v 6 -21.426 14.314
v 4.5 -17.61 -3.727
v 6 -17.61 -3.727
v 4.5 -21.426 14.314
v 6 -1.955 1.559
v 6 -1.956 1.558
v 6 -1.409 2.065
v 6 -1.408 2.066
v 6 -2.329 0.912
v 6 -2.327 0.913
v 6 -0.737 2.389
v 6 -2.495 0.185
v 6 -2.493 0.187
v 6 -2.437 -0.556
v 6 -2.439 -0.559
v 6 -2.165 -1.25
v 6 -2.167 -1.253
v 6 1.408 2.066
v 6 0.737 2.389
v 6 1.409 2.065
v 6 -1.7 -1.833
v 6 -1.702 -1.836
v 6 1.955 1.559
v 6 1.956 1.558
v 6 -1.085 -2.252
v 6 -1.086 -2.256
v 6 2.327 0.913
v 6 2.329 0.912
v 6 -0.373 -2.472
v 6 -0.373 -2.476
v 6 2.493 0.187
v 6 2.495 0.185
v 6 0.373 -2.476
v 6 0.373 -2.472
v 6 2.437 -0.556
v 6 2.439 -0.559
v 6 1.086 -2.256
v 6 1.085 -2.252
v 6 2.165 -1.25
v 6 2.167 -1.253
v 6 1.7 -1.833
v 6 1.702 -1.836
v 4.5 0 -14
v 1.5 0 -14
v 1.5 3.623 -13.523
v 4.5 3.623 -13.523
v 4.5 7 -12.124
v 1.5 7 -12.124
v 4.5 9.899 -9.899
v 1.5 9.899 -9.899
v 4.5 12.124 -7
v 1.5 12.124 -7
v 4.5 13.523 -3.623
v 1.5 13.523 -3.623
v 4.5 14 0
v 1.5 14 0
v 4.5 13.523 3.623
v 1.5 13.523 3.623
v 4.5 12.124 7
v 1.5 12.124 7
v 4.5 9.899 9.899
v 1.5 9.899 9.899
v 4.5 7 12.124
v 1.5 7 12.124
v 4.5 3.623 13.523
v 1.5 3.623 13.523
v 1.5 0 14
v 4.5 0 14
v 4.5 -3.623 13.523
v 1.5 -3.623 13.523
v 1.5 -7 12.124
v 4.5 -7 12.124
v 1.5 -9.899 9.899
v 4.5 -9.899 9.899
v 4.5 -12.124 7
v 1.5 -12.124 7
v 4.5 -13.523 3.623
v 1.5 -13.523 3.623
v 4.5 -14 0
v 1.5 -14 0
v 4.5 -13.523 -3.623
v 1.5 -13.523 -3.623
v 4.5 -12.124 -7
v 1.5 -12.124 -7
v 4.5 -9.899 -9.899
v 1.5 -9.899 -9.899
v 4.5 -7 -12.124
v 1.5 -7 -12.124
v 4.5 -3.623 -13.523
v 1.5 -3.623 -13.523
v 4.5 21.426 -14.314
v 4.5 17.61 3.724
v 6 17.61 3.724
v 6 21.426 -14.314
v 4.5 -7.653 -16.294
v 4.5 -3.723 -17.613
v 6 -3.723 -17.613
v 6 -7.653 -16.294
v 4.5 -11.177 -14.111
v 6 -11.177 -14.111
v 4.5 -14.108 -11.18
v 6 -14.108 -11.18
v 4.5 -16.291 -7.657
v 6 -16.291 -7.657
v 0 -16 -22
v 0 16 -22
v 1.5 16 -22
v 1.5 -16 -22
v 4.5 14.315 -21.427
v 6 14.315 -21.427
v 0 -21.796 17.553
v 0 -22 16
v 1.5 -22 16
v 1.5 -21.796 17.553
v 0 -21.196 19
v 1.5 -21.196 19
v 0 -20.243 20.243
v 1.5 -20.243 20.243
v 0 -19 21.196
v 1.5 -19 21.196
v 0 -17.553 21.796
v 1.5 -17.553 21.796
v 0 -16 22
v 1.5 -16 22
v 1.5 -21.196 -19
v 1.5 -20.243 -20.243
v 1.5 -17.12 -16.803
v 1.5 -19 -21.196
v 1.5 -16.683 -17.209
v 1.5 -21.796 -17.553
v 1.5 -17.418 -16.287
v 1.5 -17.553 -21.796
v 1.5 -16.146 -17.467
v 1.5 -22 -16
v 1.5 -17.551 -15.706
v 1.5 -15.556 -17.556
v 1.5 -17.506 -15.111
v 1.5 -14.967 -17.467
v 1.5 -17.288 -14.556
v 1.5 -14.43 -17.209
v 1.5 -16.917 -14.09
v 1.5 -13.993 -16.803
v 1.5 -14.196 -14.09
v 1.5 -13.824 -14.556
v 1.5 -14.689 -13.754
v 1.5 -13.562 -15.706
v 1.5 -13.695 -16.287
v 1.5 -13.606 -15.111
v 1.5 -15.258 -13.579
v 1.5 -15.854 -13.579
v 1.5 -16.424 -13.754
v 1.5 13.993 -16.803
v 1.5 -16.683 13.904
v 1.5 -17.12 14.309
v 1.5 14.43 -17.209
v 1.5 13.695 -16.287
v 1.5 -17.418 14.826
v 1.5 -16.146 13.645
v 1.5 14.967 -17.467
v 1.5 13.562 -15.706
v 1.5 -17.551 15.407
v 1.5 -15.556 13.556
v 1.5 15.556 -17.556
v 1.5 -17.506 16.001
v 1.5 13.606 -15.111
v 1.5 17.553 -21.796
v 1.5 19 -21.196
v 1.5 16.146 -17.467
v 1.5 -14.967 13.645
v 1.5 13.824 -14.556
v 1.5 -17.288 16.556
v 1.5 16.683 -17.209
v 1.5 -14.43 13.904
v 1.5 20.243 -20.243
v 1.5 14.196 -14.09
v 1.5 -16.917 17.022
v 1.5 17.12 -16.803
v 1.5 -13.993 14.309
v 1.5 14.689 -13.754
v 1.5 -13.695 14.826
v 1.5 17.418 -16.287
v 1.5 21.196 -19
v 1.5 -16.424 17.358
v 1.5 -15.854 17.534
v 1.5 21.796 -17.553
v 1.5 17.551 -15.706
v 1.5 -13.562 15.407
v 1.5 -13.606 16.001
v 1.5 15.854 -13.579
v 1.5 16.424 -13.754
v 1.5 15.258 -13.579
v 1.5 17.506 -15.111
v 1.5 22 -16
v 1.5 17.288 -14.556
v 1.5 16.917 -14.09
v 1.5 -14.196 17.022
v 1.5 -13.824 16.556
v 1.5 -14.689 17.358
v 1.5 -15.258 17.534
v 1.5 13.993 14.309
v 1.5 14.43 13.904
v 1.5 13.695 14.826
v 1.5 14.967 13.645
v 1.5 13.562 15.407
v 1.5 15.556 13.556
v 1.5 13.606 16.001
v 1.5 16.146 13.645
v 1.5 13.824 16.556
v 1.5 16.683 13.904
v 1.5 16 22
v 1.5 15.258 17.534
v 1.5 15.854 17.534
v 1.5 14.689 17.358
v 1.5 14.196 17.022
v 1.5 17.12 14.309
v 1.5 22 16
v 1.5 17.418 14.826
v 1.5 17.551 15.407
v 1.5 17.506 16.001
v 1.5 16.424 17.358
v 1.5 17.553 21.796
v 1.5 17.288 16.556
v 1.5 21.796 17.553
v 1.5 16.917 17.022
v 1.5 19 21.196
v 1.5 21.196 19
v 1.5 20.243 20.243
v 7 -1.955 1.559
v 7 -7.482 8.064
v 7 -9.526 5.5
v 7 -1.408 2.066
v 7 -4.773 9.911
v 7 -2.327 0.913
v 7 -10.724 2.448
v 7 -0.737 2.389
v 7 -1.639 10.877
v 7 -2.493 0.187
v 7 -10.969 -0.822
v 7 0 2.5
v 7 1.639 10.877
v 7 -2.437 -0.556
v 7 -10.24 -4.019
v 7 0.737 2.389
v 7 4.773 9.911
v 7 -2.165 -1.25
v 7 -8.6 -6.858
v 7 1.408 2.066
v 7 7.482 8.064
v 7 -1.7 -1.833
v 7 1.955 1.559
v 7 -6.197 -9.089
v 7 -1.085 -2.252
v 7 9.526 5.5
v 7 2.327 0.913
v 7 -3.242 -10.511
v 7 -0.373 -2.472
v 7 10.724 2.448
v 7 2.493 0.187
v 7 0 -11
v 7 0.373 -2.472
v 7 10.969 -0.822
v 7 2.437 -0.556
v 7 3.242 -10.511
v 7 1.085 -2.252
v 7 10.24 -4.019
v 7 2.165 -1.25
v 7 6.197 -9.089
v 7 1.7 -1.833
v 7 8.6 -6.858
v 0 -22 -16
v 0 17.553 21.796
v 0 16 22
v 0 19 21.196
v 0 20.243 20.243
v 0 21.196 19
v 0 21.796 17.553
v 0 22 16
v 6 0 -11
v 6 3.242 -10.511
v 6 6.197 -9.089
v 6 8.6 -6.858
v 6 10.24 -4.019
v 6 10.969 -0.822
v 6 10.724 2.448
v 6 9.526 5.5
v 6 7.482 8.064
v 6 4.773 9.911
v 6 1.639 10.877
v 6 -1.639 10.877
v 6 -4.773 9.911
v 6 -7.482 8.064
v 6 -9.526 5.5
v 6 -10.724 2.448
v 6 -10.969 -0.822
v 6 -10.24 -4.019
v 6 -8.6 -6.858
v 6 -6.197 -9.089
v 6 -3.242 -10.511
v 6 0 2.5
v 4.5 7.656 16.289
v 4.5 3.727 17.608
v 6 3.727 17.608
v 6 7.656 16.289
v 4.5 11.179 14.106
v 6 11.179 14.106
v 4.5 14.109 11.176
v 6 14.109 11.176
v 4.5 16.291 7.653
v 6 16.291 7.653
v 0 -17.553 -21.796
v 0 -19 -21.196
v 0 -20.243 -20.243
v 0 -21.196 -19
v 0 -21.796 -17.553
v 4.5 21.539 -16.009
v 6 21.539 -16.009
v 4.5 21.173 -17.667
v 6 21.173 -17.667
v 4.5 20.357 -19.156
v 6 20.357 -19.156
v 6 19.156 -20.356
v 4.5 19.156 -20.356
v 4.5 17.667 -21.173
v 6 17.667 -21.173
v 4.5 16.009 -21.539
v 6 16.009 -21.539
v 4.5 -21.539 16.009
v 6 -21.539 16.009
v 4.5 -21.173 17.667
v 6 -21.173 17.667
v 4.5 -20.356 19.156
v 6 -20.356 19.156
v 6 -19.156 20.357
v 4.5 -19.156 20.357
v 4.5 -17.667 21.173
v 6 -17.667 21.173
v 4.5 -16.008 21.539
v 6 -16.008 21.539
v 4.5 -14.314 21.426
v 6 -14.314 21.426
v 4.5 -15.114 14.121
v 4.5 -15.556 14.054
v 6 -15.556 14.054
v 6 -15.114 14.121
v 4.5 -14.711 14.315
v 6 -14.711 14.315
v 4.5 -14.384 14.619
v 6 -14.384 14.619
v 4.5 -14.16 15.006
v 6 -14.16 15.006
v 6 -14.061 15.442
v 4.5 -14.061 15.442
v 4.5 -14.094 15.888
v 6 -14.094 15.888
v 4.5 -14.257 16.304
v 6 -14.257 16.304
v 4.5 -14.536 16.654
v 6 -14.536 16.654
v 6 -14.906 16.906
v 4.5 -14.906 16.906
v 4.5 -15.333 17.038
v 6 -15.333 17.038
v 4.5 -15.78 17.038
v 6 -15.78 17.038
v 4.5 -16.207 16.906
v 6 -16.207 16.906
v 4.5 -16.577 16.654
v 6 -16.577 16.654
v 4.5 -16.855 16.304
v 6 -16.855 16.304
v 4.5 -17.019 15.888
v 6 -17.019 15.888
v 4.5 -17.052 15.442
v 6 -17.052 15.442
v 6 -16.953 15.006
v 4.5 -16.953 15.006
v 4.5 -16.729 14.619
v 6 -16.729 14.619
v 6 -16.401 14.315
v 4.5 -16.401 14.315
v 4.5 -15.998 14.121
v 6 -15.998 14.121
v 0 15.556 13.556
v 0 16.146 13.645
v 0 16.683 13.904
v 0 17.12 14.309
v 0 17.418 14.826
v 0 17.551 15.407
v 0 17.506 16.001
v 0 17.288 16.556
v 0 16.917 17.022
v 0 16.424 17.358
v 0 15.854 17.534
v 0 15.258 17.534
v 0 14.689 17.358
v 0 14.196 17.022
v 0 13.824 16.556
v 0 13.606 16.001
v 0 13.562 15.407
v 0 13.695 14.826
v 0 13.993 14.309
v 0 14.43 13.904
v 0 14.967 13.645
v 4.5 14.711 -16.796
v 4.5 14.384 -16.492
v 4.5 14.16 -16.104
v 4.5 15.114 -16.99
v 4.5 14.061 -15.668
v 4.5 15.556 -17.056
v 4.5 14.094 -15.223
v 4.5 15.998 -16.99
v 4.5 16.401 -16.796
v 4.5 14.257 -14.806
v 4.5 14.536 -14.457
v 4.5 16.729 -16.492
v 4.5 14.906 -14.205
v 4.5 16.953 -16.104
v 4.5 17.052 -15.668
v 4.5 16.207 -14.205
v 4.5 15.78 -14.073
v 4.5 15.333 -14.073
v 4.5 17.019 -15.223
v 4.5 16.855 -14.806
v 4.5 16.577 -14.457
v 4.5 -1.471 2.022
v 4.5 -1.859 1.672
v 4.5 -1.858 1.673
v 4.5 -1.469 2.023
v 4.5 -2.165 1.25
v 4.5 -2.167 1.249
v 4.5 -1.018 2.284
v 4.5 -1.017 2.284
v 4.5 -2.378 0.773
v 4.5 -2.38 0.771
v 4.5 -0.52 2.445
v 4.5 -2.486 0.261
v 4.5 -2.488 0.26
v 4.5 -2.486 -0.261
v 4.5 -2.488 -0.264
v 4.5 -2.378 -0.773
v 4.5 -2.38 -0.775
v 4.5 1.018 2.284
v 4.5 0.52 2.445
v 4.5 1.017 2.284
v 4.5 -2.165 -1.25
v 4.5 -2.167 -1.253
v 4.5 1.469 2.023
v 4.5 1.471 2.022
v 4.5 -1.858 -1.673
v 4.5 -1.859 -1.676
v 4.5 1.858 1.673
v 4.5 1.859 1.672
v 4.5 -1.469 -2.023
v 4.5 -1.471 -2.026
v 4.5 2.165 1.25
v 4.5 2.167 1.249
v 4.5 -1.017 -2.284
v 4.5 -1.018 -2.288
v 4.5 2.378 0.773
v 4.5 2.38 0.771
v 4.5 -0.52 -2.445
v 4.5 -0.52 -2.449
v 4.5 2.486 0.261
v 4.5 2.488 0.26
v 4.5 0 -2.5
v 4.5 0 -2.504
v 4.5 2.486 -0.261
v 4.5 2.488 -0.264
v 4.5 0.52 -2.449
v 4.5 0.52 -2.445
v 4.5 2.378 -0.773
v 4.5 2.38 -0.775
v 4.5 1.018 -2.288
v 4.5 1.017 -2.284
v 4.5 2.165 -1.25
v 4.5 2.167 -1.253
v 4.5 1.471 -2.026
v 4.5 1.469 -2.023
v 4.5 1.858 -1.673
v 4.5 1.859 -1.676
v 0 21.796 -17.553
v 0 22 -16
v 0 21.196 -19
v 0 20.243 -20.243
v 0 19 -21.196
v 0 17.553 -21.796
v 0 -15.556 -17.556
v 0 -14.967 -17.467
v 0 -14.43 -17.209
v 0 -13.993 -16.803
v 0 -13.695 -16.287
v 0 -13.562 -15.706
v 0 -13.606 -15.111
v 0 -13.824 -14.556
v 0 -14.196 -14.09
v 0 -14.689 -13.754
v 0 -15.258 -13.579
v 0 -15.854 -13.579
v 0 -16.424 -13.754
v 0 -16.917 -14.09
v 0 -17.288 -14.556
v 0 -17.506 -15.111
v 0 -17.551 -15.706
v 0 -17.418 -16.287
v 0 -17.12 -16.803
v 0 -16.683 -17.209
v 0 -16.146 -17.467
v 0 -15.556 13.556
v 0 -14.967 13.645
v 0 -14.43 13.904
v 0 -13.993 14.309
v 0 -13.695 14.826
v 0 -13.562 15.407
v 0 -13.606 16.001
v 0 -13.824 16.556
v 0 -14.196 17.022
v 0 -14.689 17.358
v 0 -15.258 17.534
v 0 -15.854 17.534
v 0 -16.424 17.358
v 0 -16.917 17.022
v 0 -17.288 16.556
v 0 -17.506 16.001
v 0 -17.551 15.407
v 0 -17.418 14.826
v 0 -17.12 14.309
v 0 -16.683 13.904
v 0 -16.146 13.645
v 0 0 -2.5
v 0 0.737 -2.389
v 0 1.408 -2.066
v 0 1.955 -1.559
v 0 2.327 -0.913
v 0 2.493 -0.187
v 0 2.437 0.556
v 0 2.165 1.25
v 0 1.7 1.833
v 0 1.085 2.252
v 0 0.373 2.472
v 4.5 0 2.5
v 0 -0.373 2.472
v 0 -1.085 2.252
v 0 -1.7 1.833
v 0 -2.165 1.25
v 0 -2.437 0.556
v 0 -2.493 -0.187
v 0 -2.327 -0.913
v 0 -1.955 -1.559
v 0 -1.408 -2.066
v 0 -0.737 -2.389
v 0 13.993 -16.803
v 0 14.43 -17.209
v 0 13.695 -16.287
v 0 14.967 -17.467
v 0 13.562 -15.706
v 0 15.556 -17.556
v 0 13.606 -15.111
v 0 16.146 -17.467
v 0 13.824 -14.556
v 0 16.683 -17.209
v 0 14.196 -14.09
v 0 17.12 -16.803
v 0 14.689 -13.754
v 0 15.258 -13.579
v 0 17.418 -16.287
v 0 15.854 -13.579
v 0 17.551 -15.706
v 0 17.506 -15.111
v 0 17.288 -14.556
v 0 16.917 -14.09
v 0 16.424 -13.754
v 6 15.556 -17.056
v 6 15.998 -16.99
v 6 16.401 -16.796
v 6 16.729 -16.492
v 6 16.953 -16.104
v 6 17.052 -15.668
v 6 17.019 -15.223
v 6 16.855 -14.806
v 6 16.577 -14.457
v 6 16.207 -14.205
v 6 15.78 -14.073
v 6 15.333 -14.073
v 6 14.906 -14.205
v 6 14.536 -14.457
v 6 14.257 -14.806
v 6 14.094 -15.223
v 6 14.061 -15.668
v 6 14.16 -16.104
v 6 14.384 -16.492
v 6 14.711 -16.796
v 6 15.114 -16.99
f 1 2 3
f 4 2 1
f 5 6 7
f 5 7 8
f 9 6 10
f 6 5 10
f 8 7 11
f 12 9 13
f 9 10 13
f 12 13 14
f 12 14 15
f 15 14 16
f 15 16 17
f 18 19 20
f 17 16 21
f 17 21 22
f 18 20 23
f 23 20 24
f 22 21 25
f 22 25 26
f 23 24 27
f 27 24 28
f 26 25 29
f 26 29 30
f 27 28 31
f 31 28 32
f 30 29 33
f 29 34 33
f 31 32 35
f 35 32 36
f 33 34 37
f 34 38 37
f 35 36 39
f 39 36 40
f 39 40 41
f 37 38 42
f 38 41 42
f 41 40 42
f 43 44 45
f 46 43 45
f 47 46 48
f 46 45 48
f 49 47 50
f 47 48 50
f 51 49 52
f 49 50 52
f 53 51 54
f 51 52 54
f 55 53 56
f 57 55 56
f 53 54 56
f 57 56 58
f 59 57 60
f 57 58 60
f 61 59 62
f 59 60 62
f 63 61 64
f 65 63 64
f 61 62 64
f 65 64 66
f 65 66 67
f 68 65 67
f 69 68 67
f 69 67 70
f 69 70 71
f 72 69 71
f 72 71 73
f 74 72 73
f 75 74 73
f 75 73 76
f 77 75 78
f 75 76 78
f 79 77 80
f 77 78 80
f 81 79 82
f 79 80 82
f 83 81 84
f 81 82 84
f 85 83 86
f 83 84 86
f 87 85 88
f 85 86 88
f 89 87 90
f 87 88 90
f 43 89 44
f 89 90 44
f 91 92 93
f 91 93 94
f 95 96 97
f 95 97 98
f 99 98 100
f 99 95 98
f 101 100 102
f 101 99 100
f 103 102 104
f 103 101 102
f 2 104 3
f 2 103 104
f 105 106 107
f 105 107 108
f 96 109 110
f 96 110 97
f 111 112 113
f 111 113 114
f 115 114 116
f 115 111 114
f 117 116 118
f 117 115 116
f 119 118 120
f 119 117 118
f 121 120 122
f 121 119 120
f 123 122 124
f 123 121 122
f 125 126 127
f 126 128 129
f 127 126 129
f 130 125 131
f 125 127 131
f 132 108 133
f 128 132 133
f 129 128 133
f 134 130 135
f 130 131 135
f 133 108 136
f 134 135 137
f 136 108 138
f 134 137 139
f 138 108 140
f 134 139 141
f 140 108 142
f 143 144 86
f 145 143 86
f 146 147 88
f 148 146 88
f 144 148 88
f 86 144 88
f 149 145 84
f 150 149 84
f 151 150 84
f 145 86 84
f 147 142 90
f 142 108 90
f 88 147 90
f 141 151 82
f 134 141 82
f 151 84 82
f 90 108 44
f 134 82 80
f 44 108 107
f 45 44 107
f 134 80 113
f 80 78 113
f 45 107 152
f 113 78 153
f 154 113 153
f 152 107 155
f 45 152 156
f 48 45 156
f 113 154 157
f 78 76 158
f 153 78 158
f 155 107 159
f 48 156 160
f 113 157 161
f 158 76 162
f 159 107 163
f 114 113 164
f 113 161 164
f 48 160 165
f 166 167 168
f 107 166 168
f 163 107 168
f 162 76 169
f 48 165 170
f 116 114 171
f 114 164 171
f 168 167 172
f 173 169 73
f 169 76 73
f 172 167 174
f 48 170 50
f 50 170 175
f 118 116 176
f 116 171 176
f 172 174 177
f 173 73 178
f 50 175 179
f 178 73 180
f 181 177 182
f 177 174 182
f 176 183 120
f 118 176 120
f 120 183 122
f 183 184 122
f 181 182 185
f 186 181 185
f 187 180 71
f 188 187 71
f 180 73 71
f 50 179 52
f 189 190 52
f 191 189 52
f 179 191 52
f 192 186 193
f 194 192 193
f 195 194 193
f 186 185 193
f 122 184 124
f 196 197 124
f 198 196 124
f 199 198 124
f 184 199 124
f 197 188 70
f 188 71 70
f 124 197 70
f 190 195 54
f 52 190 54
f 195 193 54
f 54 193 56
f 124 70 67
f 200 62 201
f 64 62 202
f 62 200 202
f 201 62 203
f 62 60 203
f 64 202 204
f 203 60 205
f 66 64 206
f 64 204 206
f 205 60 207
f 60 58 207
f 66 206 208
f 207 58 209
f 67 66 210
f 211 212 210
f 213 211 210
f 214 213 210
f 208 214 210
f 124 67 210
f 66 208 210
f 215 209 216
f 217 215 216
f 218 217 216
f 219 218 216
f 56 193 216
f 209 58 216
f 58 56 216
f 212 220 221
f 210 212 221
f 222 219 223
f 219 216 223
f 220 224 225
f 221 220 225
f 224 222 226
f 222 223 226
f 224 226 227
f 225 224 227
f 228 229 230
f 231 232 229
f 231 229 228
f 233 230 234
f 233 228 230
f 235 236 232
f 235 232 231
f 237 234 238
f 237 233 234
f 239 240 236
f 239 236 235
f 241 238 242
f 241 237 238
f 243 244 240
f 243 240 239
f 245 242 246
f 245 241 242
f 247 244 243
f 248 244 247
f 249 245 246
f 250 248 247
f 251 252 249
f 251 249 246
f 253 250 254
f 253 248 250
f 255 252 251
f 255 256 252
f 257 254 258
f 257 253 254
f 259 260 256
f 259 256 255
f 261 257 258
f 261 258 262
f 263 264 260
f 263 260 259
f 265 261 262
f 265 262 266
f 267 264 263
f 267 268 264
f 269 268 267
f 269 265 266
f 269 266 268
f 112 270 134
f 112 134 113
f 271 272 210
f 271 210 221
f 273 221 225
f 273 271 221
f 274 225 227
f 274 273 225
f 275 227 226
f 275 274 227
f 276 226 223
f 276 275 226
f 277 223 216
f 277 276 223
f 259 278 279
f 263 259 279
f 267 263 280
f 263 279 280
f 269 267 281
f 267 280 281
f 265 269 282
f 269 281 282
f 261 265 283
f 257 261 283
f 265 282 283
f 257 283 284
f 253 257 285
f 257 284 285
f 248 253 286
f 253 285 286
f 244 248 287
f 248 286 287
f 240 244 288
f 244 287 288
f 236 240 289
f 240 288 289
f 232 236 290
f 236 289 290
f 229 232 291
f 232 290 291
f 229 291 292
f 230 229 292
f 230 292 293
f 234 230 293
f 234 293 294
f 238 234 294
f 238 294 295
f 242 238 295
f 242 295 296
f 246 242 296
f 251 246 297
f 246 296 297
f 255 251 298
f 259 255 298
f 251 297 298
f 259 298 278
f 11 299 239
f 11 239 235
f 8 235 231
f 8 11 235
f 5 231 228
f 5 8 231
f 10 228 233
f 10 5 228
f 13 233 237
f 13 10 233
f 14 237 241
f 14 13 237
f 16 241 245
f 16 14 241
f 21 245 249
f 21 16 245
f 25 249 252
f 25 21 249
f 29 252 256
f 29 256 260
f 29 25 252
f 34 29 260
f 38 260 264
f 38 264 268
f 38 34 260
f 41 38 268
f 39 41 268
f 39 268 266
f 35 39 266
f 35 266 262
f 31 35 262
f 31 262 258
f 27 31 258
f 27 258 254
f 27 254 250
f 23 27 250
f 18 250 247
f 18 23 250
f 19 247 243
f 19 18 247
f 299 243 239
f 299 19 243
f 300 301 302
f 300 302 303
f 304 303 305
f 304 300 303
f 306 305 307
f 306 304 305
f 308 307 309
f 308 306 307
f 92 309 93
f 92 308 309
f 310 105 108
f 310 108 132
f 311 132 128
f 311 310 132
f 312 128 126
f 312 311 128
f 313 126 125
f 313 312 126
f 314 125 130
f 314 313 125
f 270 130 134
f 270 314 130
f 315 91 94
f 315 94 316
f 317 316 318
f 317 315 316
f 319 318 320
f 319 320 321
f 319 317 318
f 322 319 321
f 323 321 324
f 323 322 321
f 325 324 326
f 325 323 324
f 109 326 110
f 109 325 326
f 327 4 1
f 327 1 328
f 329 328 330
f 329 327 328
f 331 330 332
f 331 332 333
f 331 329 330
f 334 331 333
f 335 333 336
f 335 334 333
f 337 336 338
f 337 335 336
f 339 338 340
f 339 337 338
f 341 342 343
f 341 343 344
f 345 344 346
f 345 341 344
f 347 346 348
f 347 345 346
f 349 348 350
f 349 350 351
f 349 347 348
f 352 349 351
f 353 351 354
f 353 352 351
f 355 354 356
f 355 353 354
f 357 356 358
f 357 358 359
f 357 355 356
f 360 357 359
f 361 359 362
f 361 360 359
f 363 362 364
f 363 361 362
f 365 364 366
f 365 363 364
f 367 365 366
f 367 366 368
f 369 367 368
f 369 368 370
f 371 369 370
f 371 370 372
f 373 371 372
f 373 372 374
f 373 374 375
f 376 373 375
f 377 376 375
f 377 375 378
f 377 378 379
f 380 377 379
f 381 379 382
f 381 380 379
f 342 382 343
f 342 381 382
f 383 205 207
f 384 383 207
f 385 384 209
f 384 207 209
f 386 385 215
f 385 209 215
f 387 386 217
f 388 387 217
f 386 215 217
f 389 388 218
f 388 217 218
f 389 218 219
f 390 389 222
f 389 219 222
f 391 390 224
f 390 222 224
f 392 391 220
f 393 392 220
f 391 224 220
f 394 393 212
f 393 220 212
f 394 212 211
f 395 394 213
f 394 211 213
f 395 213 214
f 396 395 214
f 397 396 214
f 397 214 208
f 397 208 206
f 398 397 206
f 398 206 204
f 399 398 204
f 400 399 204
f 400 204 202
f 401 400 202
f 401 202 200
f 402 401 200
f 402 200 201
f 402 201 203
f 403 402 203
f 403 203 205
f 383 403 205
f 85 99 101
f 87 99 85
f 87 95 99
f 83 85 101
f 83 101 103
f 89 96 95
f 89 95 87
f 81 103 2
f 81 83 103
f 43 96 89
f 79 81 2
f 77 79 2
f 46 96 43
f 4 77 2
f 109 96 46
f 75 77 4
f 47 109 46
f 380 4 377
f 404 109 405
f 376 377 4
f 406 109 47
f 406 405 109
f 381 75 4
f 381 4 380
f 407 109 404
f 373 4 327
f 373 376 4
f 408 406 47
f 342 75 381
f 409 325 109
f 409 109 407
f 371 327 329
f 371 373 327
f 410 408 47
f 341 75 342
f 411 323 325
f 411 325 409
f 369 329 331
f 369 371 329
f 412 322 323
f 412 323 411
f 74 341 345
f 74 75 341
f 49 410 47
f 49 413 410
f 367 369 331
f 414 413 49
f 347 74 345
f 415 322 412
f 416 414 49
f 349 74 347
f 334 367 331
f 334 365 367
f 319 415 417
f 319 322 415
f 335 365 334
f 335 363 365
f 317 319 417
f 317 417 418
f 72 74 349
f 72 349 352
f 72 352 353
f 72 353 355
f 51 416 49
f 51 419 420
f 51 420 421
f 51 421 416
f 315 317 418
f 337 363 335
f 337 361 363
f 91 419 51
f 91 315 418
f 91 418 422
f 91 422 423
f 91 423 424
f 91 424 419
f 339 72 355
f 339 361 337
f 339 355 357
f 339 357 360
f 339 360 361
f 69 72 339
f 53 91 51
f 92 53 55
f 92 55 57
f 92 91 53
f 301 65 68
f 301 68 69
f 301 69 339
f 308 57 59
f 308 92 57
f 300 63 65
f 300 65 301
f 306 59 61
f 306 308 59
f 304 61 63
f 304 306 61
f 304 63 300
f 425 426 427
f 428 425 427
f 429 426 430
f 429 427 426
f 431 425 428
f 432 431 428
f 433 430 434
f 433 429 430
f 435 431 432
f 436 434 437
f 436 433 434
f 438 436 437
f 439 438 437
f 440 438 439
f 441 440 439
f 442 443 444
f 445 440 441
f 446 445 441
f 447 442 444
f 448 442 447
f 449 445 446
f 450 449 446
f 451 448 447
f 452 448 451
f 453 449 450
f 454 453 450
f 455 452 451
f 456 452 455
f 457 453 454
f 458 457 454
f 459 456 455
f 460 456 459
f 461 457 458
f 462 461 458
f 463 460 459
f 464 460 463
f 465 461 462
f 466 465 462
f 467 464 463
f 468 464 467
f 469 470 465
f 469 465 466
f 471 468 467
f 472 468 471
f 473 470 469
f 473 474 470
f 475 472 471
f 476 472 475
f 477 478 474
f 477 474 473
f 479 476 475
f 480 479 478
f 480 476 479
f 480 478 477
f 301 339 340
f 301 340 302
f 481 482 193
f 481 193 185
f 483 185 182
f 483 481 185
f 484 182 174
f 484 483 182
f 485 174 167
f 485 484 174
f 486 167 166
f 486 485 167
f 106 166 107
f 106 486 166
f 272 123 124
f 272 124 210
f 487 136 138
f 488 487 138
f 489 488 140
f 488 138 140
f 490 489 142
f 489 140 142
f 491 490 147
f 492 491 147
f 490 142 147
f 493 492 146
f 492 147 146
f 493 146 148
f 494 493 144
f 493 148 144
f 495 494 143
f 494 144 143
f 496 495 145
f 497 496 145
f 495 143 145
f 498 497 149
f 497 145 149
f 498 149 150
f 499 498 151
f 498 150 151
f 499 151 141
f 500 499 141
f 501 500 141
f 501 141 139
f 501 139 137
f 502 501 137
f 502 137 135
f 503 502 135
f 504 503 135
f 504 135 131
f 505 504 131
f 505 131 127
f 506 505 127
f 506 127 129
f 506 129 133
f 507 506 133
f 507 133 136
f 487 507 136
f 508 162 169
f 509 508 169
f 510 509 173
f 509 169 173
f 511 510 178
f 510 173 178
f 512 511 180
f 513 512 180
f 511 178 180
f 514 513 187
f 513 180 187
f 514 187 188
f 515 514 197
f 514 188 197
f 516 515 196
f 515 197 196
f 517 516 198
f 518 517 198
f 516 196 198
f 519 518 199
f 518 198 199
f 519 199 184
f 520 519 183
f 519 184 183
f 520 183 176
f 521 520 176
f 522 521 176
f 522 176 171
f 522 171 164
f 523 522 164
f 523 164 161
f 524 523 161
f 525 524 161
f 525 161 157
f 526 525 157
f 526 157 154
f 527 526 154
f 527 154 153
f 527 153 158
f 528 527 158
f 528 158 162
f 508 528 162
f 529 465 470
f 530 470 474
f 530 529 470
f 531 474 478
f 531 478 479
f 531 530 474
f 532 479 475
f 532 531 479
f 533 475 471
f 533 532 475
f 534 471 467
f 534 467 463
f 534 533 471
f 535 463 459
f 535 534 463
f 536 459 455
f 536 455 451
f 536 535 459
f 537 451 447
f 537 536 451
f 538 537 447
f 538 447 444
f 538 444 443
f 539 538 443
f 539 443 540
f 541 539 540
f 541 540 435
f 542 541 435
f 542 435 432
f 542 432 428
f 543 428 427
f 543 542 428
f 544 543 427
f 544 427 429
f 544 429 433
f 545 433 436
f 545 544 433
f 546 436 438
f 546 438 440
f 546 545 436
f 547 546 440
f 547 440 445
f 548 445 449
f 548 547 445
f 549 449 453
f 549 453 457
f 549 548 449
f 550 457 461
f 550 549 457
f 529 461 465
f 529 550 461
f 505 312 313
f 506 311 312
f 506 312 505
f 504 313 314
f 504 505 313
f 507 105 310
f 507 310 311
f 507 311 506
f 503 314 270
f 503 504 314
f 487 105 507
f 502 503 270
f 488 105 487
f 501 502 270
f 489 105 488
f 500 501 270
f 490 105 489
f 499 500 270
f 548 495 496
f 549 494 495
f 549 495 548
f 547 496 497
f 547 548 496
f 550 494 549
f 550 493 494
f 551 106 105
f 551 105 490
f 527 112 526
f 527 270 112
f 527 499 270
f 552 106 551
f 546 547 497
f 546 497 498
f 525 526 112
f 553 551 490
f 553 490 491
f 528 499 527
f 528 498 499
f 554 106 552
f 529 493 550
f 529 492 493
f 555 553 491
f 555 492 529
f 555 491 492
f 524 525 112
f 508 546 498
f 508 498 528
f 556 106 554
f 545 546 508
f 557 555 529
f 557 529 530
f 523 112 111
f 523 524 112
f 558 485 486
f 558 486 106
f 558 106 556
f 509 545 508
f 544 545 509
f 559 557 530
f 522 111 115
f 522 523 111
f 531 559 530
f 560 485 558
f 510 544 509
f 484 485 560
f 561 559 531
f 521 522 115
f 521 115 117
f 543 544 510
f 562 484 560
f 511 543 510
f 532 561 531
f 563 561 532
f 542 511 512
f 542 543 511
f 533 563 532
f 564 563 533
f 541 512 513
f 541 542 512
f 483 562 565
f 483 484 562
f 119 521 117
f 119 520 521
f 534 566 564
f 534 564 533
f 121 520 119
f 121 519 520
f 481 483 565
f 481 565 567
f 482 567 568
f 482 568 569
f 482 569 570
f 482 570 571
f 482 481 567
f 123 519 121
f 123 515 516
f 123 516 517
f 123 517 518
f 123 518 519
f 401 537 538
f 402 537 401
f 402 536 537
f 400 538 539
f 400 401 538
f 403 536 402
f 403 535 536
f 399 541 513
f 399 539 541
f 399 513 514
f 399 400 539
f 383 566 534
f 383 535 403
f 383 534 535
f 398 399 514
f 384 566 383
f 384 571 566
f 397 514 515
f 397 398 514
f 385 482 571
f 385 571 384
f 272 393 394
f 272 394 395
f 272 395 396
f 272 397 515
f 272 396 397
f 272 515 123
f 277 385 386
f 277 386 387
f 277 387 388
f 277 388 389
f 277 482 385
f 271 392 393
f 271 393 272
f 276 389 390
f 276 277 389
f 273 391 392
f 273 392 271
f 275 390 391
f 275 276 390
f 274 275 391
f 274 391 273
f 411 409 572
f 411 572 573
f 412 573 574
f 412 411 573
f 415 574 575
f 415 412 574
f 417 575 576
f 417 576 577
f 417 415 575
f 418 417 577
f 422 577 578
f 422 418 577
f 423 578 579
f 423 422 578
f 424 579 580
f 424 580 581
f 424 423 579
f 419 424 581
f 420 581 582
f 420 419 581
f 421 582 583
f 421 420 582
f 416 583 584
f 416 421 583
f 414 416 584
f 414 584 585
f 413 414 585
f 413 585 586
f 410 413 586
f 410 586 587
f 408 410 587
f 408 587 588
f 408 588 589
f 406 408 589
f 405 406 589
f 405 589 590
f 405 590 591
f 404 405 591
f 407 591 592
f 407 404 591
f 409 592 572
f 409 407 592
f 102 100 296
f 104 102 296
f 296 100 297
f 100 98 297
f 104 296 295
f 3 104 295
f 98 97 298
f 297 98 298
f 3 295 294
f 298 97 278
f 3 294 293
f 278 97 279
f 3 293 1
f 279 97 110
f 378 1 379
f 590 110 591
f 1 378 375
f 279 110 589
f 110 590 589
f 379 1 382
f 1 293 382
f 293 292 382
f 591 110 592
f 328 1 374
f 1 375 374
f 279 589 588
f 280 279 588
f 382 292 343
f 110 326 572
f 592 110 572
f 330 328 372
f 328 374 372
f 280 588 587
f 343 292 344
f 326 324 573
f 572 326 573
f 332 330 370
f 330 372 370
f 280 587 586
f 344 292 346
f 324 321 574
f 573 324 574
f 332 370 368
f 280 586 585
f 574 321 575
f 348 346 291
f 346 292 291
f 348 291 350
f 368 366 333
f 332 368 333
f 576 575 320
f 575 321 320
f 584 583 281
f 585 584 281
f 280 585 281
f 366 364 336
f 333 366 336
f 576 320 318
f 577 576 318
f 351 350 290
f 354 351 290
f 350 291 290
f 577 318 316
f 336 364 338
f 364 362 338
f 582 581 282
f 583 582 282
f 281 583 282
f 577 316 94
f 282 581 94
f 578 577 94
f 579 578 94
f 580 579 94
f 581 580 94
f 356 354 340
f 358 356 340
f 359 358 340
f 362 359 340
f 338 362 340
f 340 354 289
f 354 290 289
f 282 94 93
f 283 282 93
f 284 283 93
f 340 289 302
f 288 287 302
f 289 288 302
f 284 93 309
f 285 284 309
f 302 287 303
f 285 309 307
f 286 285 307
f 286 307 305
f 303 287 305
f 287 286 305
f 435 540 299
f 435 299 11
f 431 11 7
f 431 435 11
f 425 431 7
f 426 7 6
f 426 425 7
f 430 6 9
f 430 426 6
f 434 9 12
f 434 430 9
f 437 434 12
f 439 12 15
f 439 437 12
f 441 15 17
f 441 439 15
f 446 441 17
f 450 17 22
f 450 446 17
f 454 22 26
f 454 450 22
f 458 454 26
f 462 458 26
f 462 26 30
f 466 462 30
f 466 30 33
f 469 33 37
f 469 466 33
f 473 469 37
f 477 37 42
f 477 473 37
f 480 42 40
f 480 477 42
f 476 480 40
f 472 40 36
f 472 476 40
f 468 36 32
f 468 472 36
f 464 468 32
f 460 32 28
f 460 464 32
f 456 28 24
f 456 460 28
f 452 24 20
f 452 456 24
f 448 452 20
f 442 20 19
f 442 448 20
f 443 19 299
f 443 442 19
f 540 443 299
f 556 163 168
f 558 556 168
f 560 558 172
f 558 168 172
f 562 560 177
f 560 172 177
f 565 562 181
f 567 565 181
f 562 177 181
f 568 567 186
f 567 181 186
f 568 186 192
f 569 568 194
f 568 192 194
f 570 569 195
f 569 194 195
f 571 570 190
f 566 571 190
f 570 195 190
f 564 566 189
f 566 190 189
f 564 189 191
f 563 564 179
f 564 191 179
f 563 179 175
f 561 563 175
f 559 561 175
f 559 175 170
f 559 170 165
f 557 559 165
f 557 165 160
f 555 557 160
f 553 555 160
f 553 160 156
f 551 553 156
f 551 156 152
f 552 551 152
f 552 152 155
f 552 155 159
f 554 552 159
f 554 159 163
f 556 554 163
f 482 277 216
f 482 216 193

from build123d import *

# Parameters (mm, degrees)
SKETCH1_R           = 2.5
BOSS_EXTRUDE1_DEPTH = 1.5
SKETCH2_R           = 14
SKETCH2_R_2         = 2.5
BOSS_EXTRUDE2_DEPTH = 3
SKETCH4_R           = 1.5
SKETCH4_R_2         = 2.502
BOSS_EXTRUDE3_DEPTH = 1.5
SKETCH3_R           = 2
CUT_EXTRUDE1_DEPTH  = 7.5
SKETCH5_R           = 11
SKETCH5_R_2         = 2.5
BOSS_EXTRUDE4_DEPTH = 1


with BuildPart() as part:
    # Sketch1 → Boss-Extrude1 (new body)
    with BuildSketch(Plane(origin=(0, 0, 0), x_dir=(0, 0, -1), z_dir=(1, 0, 0))):
        with BuildLine():
            Line((-16, 22), (16, 22))
            ThreePointArc((16, 22), (20.242640687, 20.242640687), (22, 16))
            Line((22, 16), (22, -16))
            ThreePointArc((22, -16), (20.242640687, -20.242640687), (16, -22))
            Line((16, -22), (-16, -22))
            ThreePointArc((-16, -22), (-20.242640687, -20.242640687), (-22, -16))
            Line((-22, -16), (-22, 16))
            ThreePointArc((-22, 16), (-20.242640687, 20.242640687), (-16, 22))
        make_face()
        Circle(SKETCH1_R, mode=Mode.SUBTRACT)
    extrude(amount=BOSS_EXTRUDE1_DEPTH)

    # Sketch2 → Boss-Extrude2 (add)
    with BuildSketch(Plane(origin=(1.5, 0, 0), x_dir=(0, 0, -1), z_dir=(1, 0, 0))):
        Circle(SKETCH2_R)
        Circle(SKETCH2_R_2, mode=Mode.SUBTRACT)
    extrude(amount=BOSS_EXTRUDE2_DEPTH)

    # Sketch4 → Boss-Extrude3 (add)
    with BuildSketch(Plane(origin=(4.5, 0, 0), x_dir=(0, 0, -1), z_dir=(1, 0, 0))):
        with BuildLine():
            Line((-3.723678165, 17.610205059), (14.314456464, 21.426417539))
            ThreePointArc((14.314456464, 21.426417539), (19.79871712, 19.799262609), (21.426577165, 14.315211208))
            Line((21.426577165, 14.315211208), (17.612683935, -3.723413935))
            ThreePointArc((17.612683935, -3.723413935), (12.730477998, -12.7273661), (3.726952372, -17.610358594))
            Line((3.726952372, -17.610358594), (-14.314460707, -21.426487839))
            ThreePointArc((-14.314460707, -21.426487839), (-19.798989873, -19.798771294), (-21.426091866, -14.314059778))
            Line((-21.426091866, -14.314059778), (-17.607941103, 3.726925591))
            ThreePointArc((-17.607941103, 3.726925591), (-12.725471256, 12.728372851), (-3.723678165, 17.610205059))
        make_face()
        with Locations((15.556349186, 15.556349186)):
            Circle(SKETCH4_R, mode=Mode.SUBTRACT)
        with Locations((-15.554349186, -15.556349186)):
            Circle(SKETCH4_R, mode=Mode.SUBTRACT)
        with Locations(Location((0.002, 0, 0), (0, 0, 180))):
            Circle(SKETCH4_R_2, mode=Mode.SUBTRACT)
    extrude(amount=BOSS_EXTRUDE3_DEPTH)

    # Sketch3 → Cut-Extrude1 (cut)
    with BuildSketch(Plane(origin=(4.5, 0, 0), x_dir=(0, 0, -1), z_dir=(1, 0, 0))):
        with Locations((15.556349186, 15.556349186)):
            Circle(SKETCH3_R)
        with Locations((15.556349186, -15.556349186)):
            Circle(SKETCH3_R)
        with Locations((-15.556349186, -15.556349186)):
            Circle(SKETCH3_R)
        with Locations((-15.556349186, 15.556349186)):
            Circle(SKETCH3_R)
    extrude(amount=-CUT_EXTRUDE1_DEPTH, mode=Mode.SUBTRACT)

    # Sketch5 → Boss-Extrude4 (add)
    with BuildSketch(Plane(origin=(6, 0, 0), x_dir=(0, 0, -1), z_dir=(1, 0, 0))):
        Circle(SKETCH5_R)
        with Locations(Location((0, 0, 0), (0, 0, 180))):
            Circle(SKETCH5_R_2, mode=Mode.SUBTRACT)
    extrude(amount=BOSS_EXTRUDE4_DEPTH)


solid = part.part
